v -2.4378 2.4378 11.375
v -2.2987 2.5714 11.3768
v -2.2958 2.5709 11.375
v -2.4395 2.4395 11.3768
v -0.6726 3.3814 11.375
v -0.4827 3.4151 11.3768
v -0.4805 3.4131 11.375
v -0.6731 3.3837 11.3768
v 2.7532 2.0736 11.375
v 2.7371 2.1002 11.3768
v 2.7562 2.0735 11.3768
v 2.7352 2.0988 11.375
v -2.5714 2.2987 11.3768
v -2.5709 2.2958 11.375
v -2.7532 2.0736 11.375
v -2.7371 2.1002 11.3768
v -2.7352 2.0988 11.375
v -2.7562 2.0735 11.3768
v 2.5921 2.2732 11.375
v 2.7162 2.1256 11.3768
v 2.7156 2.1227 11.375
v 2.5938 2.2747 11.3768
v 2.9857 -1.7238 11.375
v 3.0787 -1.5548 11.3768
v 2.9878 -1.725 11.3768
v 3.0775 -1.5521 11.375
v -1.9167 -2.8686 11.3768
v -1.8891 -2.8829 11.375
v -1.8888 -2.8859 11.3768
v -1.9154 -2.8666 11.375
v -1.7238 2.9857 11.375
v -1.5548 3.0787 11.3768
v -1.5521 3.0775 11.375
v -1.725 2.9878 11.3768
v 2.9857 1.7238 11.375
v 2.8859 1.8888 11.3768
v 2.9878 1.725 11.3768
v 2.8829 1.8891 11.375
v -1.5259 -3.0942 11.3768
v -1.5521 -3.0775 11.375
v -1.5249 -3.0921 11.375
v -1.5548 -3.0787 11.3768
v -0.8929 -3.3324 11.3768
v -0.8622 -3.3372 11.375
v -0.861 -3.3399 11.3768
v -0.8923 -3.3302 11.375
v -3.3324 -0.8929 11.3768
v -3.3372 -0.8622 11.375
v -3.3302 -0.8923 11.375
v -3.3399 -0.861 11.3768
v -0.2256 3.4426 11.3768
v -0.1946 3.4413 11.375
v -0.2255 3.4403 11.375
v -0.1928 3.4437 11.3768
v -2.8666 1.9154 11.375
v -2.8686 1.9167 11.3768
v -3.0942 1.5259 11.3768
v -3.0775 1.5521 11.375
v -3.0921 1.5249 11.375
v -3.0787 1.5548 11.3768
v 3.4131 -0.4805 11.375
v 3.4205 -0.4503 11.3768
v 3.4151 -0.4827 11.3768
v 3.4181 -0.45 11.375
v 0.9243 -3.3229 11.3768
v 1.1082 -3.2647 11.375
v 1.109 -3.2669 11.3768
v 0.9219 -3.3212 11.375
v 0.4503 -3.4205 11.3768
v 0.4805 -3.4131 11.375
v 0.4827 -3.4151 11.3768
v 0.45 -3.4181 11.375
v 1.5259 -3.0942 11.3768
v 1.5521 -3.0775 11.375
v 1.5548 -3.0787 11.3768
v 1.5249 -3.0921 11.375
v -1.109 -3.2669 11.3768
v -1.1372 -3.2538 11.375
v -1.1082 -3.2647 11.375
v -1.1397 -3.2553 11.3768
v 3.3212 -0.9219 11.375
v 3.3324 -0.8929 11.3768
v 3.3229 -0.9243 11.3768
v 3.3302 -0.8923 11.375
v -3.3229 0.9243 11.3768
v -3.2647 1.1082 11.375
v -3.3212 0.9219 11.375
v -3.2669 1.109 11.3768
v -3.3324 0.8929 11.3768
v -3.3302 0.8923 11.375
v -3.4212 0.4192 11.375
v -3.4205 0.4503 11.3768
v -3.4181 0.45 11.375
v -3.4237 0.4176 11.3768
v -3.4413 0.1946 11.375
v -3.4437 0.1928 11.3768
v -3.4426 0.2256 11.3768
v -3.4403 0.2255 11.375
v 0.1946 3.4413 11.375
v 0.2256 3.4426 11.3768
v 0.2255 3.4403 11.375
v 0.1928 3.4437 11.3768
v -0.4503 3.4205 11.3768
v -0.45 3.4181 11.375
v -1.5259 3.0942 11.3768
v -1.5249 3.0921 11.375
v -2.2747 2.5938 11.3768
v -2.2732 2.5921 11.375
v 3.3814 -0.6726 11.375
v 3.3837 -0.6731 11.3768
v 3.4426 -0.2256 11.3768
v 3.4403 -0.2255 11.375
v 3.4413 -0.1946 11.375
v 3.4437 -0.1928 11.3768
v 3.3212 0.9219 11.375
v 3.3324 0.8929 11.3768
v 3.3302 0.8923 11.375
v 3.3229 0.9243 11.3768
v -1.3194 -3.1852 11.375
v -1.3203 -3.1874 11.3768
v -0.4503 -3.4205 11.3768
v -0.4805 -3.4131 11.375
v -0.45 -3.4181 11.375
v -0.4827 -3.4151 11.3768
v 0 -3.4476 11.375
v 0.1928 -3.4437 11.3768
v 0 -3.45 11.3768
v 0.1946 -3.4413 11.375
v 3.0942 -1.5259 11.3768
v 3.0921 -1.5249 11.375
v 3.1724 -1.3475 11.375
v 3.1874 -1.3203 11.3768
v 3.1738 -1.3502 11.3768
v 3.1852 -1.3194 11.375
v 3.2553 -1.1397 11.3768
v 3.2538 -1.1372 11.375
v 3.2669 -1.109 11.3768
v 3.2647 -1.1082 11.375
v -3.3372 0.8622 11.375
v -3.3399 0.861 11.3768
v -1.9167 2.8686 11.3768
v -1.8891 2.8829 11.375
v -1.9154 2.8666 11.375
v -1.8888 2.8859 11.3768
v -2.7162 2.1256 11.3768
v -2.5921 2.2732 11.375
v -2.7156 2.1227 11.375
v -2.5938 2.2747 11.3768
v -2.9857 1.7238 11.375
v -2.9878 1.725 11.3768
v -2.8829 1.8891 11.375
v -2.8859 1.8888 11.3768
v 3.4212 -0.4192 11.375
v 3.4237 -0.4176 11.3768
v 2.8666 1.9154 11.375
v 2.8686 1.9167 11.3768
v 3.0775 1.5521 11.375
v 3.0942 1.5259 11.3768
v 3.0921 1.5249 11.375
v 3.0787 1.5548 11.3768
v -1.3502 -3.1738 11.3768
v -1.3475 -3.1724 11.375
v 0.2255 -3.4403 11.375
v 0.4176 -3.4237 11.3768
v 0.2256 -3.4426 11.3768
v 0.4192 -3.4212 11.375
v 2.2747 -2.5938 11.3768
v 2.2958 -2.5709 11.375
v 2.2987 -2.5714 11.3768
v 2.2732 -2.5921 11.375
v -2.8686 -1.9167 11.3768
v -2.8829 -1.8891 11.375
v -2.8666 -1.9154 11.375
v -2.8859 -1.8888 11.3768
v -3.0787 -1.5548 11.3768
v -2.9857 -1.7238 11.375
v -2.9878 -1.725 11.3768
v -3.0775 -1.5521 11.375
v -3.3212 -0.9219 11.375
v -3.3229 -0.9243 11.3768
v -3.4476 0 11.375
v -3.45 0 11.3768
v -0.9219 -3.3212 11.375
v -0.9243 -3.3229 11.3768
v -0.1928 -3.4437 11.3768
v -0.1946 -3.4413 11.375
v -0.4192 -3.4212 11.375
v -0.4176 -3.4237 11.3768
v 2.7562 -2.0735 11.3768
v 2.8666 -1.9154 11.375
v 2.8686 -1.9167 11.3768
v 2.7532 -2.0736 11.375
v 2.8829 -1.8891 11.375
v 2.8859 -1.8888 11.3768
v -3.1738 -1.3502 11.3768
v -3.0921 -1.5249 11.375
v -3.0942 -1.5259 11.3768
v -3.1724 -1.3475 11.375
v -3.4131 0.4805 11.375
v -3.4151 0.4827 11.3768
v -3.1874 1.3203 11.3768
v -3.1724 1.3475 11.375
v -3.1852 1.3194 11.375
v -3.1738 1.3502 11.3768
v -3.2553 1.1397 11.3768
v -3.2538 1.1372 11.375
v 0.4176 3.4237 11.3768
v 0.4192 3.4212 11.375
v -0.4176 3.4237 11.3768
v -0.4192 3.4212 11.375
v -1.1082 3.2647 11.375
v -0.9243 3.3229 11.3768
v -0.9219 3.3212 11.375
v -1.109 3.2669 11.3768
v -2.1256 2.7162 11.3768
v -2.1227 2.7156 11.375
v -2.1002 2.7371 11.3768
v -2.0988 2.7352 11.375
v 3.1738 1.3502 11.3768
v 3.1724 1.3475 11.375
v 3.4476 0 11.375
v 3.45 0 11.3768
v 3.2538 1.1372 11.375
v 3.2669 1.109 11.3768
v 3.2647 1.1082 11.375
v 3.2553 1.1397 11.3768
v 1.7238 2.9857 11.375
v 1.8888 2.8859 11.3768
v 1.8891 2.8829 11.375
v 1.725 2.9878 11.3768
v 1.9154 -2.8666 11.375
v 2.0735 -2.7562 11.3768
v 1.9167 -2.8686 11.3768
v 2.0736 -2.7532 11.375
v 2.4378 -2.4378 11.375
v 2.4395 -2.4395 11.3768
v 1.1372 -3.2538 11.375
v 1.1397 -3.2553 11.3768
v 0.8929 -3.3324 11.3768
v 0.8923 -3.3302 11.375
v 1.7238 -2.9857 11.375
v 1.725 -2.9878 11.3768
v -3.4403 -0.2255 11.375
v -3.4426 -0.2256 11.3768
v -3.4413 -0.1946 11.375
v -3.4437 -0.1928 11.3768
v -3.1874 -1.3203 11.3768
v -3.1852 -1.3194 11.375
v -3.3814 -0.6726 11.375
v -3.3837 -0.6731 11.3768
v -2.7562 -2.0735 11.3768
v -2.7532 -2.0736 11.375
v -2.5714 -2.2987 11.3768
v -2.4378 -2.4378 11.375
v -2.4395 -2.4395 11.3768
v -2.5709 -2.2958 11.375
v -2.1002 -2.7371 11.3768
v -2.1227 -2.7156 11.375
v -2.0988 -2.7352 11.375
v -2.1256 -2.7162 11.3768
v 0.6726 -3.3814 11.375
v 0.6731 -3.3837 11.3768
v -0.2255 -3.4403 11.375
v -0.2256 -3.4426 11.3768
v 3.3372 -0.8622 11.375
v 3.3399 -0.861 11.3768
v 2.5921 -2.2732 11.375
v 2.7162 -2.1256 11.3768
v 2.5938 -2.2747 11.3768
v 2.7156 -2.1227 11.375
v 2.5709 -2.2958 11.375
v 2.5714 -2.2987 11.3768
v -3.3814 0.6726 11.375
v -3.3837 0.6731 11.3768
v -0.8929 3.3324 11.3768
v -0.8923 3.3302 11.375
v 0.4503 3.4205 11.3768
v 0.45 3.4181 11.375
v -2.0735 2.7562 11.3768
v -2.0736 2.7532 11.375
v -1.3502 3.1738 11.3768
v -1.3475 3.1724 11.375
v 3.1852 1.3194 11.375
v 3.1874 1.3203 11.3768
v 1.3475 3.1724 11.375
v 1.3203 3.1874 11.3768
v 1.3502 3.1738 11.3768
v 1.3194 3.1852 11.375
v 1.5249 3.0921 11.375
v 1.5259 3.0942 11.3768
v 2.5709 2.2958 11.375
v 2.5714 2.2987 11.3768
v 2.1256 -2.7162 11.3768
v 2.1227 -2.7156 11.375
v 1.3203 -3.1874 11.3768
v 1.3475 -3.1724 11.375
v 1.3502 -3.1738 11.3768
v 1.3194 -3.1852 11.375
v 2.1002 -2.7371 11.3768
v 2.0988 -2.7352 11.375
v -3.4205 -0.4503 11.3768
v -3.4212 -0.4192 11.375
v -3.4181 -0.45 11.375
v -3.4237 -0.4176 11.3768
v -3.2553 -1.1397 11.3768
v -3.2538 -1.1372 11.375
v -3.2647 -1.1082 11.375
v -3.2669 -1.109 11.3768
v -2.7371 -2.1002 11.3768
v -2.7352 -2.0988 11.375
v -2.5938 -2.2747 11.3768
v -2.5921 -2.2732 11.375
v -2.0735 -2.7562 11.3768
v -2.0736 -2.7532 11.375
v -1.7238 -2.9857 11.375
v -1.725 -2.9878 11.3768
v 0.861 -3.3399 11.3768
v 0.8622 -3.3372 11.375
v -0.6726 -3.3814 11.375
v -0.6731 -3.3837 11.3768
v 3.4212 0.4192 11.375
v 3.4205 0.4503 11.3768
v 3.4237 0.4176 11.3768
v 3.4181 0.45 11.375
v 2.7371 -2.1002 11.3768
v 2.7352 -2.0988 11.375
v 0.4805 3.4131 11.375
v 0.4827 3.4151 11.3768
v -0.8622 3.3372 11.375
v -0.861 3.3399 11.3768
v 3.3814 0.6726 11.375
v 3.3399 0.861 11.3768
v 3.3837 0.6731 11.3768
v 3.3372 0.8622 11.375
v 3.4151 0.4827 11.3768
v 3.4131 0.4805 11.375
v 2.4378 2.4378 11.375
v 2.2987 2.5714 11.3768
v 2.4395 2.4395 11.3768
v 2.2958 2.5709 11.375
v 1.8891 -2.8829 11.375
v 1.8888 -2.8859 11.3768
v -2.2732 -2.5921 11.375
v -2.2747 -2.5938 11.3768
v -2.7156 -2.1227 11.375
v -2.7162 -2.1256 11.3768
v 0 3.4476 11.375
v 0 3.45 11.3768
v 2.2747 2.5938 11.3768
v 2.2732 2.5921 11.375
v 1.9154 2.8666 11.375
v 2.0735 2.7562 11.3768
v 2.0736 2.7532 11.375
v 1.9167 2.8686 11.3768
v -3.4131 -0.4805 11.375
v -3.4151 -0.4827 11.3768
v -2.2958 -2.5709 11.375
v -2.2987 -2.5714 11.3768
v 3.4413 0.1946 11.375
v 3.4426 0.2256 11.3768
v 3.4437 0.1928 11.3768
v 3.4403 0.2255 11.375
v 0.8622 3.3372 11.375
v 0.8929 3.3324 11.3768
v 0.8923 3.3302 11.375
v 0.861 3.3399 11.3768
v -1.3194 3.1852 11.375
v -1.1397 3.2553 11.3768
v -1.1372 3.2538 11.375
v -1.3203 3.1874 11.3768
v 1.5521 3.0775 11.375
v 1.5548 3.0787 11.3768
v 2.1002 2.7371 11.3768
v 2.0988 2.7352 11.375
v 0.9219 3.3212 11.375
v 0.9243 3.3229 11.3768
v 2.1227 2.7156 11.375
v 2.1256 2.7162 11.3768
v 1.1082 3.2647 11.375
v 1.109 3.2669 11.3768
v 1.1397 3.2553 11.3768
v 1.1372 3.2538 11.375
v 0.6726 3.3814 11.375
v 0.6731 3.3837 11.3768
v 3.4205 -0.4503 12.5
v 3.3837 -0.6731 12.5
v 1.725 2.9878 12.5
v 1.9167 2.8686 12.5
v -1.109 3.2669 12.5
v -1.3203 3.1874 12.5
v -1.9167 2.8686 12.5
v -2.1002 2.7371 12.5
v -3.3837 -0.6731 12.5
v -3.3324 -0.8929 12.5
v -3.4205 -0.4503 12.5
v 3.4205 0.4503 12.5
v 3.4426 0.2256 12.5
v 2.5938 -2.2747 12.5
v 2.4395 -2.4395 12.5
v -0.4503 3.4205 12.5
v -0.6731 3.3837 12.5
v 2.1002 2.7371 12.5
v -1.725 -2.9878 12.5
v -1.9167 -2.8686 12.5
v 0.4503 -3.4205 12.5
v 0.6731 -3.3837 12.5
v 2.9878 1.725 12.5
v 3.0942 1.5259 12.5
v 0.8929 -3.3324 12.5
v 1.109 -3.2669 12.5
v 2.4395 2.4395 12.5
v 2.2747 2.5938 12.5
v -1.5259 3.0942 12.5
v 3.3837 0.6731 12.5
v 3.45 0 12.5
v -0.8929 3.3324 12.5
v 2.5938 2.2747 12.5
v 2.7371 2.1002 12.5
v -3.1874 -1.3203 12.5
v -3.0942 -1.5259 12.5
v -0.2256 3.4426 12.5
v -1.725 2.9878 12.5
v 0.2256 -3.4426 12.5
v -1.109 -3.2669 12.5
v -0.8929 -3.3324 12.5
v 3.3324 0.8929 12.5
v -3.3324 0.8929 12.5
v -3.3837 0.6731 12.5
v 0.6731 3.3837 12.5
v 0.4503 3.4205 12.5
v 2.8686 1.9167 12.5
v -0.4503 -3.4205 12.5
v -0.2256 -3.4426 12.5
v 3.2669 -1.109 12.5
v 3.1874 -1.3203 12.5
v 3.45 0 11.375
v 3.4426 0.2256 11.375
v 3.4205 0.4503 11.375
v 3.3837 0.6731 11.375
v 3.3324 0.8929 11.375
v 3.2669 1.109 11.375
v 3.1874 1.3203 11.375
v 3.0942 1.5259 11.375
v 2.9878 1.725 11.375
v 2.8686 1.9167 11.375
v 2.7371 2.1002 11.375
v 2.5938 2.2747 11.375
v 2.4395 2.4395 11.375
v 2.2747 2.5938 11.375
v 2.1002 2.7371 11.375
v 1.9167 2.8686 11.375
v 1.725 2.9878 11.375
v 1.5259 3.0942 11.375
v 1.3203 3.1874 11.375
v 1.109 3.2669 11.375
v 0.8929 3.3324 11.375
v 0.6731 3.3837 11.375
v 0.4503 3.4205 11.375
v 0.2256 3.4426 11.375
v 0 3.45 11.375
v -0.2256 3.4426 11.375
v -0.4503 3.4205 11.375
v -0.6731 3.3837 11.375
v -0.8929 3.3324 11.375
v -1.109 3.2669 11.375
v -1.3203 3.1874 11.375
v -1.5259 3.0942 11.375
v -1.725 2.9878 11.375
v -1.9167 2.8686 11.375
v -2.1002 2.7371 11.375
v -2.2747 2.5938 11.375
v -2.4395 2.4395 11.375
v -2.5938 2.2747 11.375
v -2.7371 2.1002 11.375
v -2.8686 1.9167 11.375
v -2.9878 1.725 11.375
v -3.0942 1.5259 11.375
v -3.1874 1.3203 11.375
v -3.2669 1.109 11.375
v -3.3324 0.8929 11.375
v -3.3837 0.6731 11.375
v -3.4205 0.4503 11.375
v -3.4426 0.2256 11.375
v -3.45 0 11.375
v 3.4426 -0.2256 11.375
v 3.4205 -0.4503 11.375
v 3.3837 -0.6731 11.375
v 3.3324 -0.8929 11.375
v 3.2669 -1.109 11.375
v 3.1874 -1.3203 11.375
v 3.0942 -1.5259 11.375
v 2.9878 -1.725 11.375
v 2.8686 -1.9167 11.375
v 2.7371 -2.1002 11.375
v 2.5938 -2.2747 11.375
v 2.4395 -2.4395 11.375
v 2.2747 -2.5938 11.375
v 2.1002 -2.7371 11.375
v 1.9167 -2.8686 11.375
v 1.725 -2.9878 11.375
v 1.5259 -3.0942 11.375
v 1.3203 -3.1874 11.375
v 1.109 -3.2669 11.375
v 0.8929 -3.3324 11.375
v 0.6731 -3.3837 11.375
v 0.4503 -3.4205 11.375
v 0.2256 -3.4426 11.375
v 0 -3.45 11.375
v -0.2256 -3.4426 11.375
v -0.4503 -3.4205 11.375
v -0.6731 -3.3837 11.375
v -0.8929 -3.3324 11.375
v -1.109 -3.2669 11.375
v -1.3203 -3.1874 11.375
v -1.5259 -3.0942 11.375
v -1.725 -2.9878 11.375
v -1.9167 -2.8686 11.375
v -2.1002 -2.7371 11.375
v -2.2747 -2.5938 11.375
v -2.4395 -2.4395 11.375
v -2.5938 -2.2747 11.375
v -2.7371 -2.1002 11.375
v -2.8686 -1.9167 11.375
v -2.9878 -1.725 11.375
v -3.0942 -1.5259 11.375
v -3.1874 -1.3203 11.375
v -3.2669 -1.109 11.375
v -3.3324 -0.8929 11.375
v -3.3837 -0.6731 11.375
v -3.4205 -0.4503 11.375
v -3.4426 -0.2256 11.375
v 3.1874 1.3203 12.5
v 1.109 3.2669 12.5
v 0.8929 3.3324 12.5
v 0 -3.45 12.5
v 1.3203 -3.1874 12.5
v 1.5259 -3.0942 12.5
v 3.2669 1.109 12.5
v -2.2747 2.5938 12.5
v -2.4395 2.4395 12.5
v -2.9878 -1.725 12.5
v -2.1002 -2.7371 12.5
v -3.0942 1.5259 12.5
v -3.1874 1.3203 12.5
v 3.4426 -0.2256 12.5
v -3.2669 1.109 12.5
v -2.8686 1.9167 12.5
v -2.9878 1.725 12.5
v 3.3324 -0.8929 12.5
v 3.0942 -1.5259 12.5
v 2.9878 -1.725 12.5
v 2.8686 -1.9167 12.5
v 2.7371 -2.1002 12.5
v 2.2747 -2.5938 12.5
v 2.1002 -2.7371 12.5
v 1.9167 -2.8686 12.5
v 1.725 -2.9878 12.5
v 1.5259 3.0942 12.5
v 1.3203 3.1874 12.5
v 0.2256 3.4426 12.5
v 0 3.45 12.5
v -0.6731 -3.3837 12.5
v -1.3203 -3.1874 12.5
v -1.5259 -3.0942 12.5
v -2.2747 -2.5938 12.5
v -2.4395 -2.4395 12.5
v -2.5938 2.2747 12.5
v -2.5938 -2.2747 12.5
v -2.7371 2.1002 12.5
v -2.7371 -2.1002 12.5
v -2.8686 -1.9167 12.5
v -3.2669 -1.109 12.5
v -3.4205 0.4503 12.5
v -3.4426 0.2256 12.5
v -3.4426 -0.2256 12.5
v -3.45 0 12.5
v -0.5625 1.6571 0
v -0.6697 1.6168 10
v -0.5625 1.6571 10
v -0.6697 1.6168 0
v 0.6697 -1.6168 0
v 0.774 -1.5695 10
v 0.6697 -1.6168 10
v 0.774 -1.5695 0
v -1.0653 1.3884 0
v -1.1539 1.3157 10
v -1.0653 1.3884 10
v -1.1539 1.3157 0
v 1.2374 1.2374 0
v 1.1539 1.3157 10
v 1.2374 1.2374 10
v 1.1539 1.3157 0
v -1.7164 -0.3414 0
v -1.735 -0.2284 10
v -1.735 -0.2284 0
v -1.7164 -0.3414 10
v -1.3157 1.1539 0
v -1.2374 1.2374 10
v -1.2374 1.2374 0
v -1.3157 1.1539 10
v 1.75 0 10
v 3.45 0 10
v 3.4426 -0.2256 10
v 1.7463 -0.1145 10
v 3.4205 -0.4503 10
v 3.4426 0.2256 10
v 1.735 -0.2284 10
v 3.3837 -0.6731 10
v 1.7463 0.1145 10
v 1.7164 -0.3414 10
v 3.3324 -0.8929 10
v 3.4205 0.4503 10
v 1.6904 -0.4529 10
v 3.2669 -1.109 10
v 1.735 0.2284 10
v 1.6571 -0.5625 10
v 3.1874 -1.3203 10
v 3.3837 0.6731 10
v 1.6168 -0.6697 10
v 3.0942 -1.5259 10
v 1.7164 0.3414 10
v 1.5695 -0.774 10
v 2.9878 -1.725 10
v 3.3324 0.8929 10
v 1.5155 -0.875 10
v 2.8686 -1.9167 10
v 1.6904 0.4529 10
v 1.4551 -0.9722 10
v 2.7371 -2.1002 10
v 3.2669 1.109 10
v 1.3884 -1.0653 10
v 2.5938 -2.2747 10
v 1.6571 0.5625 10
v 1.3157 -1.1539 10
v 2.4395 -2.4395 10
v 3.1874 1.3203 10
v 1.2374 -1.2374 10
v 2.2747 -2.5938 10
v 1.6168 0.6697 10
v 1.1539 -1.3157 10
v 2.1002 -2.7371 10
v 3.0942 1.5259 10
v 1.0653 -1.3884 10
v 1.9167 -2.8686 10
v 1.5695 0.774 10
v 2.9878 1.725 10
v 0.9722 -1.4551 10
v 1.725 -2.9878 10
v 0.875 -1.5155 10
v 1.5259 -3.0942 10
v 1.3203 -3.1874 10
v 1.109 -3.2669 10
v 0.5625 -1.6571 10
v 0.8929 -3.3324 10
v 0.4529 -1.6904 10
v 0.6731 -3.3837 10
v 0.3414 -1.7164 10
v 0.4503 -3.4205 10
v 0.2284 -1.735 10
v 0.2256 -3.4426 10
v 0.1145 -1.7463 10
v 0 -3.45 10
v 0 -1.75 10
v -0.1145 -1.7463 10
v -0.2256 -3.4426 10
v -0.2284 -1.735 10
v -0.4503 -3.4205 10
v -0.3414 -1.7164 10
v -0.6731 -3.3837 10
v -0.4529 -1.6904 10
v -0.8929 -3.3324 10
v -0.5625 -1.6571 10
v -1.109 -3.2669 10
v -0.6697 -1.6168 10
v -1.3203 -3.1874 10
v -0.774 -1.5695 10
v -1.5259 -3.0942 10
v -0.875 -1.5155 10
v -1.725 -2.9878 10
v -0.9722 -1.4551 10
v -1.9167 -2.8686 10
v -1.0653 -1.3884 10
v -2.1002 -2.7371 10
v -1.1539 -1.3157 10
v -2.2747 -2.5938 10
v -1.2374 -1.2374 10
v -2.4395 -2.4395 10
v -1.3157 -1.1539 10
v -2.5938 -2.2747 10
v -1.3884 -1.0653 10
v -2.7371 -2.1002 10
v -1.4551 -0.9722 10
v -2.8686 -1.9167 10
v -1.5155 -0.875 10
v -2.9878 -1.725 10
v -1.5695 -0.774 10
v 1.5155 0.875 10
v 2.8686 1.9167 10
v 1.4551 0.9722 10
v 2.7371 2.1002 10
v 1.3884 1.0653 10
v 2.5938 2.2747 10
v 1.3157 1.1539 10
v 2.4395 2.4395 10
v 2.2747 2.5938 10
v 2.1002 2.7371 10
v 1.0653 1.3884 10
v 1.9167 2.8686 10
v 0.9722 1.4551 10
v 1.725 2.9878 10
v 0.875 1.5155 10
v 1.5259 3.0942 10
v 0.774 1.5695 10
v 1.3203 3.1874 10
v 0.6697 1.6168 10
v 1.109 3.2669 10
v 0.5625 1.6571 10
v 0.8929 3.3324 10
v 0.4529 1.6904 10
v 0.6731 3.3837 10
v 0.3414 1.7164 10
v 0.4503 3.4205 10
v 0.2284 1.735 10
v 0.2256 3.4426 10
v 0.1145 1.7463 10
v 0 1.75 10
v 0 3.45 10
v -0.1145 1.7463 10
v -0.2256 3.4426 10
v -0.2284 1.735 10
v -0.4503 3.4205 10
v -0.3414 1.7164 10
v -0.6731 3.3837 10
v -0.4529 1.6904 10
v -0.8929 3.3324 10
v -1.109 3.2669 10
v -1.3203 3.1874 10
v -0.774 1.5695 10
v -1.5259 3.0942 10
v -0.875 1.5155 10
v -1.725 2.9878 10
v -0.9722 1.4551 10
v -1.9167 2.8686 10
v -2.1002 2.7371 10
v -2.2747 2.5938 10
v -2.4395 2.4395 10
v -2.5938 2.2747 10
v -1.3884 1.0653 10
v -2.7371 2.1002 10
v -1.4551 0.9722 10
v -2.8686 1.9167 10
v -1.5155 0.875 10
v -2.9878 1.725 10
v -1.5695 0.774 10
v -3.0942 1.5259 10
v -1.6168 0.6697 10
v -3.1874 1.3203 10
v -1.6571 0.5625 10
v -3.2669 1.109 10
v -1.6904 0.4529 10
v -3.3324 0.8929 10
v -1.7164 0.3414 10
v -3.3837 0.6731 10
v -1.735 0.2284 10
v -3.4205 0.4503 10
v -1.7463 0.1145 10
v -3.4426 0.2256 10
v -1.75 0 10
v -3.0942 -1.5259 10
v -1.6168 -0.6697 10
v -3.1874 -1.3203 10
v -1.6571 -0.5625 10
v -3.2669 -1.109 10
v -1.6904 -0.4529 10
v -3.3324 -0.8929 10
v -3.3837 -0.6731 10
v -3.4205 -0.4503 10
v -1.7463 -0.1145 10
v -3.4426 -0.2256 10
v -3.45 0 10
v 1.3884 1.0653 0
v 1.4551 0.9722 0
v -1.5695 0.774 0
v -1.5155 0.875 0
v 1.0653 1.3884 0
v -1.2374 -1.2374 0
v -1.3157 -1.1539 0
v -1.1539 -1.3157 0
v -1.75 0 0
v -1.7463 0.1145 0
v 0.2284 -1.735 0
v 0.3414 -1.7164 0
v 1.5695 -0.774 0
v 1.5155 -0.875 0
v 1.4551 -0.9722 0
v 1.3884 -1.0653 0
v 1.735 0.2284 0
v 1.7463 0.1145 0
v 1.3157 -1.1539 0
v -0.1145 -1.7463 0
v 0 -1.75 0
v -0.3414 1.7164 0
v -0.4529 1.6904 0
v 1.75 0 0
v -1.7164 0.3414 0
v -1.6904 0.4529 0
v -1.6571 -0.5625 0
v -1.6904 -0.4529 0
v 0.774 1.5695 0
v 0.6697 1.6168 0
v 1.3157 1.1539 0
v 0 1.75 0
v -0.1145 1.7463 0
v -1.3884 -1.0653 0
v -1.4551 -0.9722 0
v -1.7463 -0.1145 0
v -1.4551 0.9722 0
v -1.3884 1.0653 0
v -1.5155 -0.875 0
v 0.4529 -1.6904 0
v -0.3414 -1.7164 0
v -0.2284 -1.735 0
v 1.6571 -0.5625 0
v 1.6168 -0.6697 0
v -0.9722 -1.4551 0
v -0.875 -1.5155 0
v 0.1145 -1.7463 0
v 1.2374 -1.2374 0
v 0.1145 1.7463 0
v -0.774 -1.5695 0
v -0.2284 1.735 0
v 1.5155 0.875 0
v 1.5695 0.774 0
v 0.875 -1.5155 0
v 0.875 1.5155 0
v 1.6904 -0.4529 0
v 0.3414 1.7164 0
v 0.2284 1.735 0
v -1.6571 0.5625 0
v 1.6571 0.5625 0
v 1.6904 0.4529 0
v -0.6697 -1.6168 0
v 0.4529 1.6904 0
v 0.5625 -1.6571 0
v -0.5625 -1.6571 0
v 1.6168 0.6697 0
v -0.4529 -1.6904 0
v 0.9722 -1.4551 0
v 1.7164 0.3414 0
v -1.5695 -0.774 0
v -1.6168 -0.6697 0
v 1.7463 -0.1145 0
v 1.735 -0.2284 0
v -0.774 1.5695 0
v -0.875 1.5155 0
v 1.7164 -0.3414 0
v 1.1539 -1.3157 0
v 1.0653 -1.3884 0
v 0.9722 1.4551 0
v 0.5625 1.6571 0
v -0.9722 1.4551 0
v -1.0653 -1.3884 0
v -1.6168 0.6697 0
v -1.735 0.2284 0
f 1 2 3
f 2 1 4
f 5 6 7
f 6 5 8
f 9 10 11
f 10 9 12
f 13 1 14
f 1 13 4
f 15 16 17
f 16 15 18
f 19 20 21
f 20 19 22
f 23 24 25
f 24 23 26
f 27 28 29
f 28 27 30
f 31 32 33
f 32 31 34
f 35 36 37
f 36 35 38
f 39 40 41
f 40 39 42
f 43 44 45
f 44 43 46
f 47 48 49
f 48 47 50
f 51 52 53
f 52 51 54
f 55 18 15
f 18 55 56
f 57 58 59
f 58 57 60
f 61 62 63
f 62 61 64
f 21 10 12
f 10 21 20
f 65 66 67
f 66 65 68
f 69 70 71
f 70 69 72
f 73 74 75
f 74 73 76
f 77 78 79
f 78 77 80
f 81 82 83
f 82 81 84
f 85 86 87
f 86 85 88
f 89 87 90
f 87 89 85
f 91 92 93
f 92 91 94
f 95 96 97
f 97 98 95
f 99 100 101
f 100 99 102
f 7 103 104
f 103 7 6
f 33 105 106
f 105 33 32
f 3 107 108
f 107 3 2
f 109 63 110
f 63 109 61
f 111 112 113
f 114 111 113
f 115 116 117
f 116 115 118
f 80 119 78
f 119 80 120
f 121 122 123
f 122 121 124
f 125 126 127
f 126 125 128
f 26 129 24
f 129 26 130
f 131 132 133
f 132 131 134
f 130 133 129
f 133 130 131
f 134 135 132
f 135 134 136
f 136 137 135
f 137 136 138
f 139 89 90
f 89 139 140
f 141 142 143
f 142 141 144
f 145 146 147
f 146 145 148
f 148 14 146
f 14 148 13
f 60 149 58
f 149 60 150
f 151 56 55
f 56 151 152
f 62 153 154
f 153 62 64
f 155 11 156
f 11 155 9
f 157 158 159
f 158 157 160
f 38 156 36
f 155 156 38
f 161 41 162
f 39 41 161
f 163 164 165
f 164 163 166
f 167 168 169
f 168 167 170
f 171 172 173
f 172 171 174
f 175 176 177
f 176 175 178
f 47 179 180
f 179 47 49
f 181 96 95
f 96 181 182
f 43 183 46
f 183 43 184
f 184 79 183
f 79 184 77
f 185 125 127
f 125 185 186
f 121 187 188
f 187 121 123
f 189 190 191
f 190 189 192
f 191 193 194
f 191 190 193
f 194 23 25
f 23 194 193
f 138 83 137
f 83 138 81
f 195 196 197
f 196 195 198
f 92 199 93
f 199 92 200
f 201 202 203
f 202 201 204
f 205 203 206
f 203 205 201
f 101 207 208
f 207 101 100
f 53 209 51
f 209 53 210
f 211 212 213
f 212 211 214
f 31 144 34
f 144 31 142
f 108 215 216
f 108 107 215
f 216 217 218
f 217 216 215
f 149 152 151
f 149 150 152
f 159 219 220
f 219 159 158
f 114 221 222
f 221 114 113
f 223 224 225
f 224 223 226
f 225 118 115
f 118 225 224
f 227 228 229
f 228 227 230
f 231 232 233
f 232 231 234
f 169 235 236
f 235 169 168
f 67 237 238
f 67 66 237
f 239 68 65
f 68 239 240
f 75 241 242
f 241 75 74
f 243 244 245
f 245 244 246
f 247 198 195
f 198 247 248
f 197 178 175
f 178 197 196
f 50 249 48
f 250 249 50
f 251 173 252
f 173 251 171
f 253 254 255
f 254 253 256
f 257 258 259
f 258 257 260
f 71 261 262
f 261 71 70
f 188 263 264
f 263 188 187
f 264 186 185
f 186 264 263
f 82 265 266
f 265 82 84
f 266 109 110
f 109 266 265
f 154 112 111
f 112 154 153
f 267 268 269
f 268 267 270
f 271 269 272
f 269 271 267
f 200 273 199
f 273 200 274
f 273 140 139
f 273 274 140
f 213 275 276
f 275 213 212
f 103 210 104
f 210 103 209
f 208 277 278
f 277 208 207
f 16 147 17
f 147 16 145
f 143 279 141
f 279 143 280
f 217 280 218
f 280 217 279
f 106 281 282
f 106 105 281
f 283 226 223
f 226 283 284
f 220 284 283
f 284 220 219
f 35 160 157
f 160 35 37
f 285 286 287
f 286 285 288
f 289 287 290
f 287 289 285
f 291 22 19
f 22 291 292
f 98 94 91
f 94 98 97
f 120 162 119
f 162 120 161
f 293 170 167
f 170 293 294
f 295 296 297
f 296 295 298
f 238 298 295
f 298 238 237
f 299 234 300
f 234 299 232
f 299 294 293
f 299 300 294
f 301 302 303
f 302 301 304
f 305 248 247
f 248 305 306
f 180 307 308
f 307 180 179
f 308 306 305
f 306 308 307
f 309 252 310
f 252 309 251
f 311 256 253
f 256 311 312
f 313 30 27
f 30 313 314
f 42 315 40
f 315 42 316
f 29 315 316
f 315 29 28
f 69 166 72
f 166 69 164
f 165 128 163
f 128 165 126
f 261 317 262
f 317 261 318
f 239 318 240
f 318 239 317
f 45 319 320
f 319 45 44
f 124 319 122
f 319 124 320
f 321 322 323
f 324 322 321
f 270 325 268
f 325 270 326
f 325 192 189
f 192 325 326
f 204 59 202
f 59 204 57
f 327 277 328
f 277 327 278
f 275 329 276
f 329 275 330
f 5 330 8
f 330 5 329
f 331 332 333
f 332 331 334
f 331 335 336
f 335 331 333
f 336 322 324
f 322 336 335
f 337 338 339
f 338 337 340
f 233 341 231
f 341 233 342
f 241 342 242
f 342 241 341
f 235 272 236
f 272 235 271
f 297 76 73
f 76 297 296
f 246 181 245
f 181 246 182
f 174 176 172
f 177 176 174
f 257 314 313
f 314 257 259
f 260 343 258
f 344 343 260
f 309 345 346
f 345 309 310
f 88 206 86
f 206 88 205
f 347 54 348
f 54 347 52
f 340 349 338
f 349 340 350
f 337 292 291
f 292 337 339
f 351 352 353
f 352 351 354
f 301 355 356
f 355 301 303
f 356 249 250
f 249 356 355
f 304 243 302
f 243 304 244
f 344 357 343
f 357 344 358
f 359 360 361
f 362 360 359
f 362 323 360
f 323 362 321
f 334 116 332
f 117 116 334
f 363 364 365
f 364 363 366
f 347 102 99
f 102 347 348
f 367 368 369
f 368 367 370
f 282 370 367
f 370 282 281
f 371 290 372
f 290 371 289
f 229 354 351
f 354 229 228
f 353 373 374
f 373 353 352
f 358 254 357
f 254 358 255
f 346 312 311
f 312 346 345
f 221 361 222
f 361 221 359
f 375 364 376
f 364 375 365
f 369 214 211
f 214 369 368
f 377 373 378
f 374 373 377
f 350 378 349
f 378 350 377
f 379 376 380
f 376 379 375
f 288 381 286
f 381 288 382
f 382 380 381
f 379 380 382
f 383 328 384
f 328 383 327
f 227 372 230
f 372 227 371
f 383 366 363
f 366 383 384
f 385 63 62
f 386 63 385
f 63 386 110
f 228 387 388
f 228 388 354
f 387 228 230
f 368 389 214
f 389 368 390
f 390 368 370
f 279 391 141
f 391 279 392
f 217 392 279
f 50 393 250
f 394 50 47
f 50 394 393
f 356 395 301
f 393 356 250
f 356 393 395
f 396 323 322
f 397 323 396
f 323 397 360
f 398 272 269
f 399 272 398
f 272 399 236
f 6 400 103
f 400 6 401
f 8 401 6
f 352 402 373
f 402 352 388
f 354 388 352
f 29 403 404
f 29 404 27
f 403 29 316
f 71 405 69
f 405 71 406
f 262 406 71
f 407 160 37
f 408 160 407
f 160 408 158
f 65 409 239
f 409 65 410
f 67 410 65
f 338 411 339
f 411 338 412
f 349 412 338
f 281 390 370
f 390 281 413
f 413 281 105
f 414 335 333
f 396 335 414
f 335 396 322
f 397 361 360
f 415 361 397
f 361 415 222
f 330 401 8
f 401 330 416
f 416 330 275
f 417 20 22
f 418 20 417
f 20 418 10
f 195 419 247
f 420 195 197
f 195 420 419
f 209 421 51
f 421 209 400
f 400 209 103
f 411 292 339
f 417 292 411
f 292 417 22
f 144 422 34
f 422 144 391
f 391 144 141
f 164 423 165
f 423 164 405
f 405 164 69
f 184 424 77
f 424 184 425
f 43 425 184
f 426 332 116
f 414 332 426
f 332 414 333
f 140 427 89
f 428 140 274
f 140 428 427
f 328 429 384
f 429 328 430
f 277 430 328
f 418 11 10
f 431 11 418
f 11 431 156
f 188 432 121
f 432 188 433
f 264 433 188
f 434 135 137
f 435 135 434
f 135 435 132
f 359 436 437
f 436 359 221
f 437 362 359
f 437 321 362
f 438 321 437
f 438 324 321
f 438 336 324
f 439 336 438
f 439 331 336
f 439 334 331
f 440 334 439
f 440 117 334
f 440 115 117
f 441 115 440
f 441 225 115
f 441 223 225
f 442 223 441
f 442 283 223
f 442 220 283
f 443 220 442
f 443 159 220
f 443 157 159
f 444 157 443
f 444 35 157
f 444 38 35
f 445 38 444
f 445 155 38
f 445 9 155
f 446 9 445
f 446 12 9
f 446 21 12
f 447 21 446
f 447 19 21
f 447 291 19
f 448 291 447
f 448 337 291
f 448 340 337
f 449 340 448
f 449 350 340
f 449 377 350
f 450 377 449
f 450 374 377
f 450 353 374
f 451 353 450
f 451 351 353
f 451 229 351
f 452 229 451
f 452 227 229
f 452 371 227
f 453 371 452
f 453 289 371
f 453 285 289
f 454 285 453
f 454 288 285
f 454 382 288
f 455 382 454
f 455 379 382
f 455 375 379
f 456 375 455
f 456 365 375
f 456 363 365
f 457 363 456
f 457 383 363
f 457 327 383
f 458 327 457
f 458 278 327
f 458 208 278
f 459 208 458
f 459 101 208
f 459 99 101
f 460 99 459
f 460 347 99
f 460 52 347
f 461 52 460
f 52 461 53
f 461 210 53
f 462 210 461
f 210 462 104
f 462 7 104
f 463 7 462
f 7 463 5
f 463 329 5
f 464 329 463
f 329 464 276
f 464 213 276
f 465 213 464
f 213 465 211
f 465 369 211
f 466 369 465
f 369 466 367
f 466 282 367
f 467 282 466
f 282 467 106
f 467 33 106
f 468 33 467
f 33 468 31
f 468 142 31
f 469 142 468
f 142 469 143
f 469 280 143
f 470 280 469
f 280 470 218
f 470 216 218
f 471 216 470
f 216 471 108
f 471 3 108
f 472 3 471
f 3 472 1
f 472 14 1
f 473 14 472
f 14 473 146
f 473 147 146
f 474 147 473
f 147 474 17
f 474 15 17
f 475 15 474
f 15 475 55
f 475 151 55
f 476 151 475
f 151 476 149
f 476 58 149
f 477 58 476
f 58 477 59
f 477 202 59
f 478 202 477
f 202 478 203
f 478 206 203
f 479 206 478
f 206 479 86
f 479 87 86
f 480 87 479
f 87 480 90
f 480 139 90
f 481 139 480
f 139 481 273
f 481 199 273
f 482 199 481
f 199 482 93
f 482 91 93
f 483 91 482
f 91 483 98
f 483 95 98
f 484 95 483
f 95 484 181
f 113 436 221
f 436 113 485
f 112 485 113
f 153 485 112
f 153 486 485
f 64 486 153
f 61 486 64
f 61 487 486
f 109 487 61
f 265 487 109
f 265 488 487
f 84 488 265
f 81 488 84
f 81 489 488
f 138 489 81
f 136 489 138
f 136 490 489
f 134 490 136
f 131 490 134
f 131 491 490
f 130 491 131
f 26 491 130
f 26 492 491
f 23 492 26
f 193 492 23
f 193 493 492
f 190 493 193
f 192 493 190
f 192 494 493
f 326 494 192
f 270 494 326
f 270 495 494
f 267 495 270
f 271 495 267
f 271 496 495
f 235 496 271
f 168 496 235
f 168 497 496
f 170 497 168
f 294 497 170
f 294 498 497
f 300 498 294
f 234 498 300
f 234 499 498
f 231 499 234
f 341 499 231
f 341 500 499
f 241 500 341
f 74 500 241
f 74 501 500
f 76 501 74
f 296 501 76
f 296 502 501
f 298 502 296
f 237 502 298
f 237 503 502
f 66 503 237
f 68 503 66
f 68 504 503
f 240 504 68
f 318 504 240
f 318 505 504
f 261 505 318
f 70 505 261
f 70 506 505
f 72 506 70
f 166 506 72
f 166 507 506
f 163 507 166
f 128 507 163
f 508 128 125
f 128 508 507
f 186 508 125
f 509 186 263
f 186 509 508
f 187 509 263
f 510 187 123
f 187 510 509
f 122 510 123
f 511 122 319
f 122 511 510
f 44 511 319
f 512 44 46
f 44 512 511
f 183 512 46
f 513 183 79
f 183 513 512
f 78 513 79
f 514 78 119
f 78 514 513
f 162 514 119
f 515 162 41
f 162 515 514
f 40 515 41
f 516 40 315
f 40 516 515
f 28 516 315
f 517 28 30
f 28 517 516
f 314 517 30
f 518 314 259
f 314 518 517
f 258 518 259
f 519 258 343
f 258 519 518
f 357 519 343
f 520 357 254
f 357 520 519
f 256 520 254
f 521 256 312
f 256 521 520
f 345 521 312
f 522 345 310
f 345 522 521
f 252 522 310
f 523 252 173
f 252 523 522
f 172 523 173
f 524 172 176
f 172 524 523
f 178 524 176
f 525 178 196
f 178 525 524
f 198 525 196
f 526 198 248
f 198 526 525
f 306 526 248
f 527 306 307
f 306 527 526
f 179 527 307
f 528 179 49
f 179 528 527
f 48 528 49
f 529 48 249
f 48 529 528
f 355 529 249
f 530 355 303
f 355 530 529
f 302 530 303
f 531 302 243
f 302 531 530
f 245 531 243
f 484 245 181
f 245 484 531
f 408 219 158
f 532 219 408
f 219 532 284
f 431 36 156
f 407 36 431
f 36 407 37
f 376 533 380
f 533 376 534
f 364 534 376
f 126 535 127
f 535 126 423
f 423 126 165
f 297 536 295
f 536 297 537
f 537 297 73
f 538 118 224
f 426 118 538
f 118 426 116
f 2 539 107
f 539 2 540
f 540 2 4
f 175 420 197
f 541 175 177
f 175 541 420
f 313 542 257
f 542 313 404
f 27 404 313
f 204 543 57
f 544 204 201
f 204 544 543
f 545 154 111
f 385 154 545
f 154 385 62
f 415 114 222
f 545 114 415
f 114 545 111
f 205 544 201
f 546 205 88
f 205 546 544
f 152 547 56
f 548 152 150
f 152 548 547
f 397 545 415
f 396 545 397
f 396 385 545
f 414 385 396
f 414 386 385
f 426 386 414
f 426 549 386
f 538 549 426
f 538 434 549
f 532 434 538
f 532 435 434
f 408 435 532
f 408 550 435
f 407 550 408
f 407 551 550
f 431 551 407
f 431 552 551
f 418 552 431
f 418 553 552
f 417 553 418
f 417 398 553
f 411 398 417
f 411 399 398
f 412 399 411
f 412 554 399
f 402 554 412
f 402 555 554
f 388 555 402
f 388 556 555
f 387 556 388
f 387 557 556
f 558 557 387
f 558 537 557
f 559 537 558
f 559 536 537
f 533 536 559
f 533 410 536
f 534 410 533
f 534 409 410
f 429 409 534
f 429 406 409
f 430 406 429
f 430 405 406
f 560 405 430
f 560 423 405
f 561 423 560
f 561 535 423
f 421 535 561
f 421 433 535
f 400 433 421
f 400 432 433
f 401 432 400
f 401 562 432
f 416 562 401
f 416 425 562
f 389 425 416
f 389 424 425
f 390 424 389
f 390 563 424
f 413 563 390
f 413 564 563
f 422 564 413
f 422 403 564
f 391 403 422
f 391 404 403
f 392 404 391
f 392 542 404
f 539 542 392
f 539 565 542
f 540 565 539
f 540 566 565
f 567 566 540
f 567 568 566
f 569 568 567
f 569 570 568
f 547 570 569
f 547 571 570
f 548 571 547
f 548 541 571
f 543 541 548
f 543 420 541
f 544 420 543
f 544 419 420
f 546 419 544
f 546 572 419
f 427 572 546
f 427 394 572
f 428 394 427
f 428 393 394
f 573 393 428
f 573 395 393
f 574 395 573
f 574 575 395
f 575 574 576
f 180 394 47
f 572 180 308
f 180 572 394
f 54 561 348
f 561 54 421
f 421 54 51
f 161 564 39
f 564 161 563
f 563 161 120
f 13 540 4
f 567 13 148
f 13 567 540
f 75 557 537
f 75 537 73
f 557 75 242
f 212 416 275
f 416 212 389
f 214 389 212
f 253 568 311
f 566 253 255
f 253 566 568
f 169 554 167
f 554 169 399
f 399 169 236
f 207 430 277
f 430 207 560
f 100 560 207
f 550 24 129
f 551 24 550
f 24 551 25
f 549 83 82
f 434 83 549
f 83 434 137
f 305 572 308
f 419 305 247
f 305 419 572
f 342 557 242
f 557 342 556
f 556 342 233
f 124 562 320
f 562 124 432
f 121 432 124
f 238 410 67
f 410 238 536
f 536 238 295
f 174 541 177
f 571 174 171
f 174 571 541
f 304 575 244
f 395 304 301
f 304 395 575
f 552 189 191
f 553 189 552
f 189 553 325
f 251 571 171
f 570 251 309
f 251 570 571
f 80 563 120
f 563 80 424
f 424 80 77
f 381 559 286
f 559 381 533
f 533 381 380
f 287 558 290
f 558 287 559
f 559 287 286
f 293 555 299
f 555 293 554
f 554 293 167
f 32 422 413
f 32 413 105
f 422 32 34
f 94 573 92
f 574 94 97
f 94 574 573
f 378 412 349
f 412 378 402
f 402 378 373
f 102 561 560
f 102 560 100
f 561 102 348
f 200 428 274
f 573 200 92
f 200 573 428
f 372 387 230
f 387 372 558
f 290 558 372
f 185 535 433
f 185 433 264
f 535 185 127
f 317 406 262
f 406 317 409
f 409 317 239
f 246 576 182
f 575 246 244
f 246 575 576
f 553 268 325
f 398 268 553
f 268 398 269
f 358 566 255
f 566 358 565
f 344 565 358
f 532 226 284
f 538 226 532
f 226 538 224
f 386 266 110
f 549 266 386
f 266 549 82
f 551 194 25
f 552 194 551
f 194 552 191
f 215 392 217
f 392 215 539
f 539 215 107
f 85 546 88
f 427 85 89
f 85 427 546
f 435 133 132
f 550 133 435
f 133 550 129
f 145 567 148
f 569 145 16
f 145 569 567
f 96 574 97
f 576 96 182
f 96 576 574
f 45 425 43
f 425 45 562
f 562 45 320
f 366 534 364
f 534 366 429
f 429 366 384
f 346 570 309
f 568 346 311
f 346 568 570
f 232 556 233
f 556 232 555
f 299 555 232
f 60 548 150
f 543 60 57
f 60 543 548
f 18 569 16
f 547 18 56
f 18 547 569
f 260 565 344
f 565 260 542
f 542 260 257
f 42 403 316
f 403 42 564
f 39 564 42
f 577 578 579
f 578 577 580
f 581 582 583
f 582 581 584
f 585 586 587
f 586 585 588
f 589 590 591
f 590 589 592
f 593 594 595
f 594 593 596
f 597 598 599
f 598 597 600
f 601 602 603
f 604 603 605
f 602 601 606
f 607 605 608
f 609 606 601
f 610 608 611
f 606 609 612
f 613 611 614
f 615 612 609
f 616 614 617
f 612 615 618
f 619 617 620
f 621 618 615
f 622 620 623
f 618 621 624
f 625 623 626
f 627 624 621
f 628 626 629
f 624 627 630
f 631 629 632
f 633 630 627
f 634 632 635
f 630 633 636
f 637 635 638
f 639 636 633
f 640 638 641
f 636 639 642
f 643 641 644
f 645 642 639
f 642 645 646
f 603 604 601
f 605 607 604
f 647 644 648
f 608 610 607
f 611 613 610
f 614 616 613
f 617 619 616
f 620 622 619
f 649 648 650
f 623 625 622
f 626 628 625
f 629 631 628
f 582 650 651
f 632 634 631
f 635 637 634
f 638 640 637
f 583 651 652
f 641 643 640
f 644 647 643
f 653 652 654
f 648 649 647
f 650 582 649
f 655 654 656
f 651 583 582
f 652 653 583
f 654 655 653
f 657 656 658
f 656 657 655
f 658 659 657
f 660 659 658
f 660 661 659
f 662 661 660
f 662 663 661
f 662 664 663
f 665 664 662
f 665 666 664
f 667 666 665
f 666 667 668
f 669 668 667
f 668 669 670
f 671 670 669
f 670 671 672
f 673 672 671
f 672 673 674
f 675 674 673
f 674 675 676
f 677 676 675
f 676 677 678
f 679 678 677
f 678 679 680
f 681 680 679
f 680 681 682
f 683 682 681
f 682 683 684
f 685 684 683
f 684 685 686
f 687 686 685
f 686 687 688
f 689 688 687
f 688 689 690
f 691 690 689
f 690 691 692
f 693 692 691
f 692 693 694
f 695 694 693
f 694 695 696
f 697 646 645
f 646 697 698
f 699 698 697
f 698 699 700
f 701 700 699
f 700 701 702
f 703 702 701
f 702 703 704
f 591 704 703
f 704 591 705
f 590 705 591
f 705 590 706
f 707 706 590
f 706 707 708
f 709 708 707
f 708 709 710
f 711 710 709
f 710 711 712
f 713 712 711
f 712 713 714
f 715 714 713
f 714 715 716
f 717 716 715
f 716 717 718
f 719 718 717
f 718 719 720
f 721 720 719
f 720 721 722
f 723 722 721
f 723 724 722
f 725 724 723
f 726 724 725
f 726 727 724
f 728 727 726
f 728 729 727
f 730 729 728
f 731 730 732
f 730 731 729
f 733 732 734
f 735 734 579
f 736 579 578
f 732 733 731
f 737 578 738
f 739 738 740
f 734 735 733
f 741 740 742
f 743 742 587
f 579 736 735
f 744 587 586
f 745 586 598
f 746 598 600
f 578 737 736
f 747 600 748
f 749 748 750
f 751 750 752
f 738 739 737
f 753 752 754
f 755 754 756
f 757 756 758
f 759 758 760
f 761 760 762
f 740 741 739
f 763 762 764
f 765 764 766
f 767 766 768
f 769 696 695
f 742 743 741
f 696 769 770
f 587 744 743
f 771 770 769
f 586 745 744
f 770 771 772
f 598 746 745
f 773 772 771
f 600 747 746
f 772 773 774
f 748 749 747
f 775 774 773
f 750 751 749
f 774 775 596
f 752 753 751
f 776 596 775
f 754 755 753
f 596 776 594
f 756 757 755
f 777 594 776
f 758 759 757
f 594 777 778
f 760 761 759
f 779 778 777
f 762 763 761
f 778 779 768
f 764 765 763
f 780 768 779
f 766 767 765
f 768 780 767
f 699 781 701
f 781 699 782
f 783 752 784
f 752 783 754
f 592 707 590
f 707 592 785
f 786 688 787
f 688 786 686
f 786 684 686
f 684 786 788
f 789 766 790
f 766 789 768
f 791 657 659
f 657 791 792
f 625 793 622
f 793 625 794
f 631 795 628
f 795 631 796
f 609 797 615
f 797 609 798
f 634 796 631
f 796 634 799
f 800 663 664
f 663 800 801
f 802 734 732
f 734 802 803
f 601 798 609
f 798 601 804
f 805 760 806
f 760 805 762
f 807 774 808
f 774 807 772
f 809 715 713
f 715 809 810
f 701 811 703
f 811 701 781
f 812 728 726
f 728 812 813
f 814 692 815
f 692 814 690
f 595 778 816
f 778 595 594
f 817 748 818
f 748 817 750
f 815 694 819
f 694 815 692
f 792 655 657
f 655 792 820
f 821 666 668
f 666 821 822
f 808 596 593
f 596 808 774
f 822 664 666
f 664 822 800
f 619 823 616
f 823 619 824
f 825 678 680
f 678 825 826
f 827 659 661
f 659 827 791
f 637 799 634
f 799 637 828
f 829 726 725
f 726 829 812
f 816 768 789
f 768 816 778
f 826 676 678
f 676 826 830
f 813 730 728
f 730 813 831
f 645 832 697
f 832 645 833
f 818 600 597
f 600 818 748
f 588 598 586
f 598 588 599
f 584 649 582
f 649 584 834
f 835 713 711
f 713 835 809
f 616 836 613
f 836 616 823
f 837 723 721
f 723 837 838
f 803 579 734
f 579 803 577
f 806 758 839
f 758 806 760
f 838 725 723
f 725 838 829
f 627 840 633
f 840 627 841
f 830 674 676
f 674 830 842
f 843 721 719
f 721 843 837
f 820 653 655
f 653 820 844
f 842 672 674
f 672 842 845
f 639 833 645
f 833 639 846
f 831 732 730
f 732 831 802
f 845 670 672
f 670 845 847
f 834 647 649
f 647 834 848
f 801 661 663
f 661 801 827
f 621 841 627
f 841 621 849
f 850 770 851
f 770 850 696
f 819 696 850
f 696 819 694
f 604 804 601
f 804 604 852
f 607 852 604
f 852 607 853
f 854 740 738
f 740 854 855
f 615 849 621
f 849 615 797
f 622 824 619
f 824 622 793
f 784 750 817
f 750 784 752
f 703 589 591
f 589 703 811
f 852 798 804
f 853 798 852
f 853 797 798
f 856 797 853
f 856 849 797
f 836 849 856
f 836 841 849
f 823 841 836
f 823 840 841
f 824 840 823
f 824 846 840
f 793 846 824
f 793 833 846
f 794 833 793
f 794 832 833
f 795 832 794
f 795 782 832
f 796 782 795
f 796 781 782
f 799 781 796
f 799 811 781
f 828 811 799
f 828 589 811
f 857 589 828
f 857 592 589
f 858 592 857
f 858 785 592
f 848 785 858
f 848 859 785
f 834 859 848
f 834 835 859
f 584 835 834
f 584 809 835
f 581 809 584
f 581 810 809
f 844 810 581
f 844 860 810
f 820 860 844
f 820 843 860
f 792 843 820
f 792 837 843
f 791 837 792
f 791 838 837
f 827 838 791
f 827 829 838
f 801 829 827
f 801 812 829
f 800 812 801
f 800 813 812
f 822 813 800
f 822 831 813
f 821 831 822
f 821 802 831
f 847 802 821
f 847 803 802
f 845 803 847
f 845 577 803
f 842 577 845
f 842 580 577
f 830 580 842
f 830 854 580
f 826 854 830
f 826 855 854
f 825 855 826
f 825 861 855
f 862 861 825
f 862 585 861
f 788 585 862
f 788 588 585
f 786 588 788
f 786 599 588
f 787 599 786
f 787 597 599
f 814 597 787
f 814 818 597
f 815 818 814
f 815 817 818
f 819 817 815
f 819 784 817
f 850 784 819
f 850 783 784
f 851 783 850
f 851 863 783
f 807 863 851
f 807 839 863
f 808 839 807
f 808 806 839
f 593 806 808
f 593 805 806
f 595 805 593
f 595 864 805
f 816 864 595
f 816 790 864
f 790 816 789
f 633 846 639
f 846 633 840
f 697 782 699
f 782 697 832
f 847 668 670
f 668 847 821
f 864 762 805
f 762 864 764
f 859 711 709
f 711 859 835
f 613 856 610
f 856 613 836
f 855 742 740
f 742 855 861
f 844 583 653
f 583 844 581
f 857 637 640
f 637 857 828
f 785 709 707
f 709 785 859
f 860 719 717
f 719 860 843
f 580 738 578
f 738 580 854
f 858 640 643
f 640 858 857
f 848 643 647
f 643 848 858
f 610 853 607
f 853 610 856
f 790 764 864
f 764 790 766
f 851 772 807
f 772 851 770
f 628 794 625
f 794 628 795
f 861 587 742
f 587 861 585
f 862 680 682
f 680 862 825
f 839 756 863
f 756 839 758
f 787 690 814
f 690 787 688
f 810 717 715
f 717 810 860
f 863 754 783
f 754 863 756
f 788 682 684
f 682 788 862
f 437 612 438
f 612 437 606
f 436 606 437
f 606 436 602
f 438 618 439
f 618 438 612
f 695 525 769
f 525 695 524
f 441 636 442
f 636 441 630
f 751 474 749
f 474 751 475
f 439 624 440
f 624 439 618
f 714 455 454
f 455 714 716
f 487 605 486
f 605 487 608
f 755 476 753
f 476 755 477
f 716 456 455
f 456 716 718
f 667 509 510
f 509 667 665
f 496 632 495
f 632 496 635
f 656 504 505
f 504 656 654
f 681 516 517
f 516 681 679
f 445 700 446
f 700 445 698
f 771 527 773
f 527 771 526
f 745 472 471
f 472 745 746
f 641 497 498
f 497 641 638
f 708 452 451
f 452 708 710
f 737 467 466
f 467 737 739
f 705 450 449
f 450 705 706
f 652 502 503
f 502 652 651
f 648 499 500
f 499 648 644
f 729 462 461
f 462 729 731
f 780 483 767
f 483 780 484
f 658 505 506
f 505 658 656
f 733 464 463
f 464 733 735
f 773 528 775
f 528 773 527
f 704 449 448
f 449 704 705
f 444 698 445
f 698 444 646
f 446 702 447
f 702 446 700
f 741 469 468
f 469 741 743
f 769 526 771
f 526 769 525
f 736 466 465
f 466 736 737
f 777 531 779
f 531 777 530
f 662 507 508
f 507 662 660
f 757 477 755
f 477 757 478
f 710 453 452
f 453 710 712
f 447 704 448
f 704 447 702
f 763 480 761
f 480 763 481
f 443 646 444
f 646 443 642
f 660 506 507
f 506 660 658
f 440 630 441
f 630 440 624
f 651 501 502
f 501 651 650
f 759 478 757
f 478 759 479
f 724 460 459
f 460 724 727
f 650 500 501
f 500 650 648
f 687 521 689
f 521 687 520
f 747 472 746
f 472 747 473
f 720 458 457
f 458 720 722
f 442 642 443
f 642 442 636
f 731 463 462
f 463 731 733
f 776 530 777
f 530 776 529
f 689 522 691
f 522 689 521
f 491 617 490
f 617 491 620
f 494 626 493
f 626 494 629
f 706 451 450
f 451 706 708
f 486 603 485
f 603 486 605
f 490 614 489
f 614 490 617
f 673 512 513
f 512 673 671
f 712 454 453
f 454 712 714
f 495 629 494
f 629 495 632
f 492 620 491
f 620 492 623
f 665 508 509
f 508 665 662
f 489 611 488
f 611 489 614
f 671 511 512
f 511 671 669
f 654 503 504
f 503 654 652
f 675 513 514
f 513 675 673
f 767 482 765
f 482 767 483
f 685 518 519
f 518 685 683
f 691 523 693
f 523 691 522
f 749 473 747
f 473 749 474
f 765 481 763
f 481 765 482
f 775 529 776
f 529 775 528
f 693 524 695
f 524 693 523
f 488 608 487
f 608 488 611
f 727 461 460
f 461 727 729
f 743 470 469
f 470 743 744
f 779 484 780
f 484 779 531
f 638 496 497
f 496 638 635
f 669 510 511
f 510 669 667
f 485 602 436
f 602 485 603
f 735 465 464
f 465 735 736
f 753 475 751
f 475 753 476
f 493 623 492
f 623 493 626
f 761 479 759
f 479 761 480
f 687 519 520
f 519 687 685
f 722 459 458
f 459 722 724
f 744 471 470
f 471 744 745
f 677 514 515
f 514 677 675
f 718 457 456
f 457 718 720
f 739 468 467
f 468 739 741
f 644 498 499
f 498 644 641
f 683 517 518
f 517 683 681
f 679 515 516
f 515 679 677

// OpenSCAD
$fn = 96;

shaft_d = 3.5;
length = 10;

head_d = 6.9;
head_h = 2.5;

// Simple pan head approximation: cylindrical skirt + spherical cap
skirt_h = head_h * 0.55;
cap_h   = head_h - skirt_h;

module pan_head_screw(shaft_d, length, head_d, head_h) {
    skirt_h = head_h * 0.55;
    cap_h   = head_h - skirt_h;

    union() {
        // Shaft
        cylinder(d=shaft_d, h=length);

        // Head skirt
        translate([0,0,length])
            cylinder(d=head_d, h=skirt_h);

        // Head dome (spherical cap)
        // Sphere radius chosen so that cap height = cap_h and base radius = head_d/2
        r_base = head_d/2;
        R = (r_base*r_base + cap_h*cap_h) / (2*cap_h);

        translate([0,0,length + skirt_h])
            intersection() {
                translate([0,0,R - cap_h]) sphere(r=R);
                cylinder(d=head_d, h=cap_h);
            }
    }
}

pan_head_screw(shaft_d, length, head_d, head_h);
